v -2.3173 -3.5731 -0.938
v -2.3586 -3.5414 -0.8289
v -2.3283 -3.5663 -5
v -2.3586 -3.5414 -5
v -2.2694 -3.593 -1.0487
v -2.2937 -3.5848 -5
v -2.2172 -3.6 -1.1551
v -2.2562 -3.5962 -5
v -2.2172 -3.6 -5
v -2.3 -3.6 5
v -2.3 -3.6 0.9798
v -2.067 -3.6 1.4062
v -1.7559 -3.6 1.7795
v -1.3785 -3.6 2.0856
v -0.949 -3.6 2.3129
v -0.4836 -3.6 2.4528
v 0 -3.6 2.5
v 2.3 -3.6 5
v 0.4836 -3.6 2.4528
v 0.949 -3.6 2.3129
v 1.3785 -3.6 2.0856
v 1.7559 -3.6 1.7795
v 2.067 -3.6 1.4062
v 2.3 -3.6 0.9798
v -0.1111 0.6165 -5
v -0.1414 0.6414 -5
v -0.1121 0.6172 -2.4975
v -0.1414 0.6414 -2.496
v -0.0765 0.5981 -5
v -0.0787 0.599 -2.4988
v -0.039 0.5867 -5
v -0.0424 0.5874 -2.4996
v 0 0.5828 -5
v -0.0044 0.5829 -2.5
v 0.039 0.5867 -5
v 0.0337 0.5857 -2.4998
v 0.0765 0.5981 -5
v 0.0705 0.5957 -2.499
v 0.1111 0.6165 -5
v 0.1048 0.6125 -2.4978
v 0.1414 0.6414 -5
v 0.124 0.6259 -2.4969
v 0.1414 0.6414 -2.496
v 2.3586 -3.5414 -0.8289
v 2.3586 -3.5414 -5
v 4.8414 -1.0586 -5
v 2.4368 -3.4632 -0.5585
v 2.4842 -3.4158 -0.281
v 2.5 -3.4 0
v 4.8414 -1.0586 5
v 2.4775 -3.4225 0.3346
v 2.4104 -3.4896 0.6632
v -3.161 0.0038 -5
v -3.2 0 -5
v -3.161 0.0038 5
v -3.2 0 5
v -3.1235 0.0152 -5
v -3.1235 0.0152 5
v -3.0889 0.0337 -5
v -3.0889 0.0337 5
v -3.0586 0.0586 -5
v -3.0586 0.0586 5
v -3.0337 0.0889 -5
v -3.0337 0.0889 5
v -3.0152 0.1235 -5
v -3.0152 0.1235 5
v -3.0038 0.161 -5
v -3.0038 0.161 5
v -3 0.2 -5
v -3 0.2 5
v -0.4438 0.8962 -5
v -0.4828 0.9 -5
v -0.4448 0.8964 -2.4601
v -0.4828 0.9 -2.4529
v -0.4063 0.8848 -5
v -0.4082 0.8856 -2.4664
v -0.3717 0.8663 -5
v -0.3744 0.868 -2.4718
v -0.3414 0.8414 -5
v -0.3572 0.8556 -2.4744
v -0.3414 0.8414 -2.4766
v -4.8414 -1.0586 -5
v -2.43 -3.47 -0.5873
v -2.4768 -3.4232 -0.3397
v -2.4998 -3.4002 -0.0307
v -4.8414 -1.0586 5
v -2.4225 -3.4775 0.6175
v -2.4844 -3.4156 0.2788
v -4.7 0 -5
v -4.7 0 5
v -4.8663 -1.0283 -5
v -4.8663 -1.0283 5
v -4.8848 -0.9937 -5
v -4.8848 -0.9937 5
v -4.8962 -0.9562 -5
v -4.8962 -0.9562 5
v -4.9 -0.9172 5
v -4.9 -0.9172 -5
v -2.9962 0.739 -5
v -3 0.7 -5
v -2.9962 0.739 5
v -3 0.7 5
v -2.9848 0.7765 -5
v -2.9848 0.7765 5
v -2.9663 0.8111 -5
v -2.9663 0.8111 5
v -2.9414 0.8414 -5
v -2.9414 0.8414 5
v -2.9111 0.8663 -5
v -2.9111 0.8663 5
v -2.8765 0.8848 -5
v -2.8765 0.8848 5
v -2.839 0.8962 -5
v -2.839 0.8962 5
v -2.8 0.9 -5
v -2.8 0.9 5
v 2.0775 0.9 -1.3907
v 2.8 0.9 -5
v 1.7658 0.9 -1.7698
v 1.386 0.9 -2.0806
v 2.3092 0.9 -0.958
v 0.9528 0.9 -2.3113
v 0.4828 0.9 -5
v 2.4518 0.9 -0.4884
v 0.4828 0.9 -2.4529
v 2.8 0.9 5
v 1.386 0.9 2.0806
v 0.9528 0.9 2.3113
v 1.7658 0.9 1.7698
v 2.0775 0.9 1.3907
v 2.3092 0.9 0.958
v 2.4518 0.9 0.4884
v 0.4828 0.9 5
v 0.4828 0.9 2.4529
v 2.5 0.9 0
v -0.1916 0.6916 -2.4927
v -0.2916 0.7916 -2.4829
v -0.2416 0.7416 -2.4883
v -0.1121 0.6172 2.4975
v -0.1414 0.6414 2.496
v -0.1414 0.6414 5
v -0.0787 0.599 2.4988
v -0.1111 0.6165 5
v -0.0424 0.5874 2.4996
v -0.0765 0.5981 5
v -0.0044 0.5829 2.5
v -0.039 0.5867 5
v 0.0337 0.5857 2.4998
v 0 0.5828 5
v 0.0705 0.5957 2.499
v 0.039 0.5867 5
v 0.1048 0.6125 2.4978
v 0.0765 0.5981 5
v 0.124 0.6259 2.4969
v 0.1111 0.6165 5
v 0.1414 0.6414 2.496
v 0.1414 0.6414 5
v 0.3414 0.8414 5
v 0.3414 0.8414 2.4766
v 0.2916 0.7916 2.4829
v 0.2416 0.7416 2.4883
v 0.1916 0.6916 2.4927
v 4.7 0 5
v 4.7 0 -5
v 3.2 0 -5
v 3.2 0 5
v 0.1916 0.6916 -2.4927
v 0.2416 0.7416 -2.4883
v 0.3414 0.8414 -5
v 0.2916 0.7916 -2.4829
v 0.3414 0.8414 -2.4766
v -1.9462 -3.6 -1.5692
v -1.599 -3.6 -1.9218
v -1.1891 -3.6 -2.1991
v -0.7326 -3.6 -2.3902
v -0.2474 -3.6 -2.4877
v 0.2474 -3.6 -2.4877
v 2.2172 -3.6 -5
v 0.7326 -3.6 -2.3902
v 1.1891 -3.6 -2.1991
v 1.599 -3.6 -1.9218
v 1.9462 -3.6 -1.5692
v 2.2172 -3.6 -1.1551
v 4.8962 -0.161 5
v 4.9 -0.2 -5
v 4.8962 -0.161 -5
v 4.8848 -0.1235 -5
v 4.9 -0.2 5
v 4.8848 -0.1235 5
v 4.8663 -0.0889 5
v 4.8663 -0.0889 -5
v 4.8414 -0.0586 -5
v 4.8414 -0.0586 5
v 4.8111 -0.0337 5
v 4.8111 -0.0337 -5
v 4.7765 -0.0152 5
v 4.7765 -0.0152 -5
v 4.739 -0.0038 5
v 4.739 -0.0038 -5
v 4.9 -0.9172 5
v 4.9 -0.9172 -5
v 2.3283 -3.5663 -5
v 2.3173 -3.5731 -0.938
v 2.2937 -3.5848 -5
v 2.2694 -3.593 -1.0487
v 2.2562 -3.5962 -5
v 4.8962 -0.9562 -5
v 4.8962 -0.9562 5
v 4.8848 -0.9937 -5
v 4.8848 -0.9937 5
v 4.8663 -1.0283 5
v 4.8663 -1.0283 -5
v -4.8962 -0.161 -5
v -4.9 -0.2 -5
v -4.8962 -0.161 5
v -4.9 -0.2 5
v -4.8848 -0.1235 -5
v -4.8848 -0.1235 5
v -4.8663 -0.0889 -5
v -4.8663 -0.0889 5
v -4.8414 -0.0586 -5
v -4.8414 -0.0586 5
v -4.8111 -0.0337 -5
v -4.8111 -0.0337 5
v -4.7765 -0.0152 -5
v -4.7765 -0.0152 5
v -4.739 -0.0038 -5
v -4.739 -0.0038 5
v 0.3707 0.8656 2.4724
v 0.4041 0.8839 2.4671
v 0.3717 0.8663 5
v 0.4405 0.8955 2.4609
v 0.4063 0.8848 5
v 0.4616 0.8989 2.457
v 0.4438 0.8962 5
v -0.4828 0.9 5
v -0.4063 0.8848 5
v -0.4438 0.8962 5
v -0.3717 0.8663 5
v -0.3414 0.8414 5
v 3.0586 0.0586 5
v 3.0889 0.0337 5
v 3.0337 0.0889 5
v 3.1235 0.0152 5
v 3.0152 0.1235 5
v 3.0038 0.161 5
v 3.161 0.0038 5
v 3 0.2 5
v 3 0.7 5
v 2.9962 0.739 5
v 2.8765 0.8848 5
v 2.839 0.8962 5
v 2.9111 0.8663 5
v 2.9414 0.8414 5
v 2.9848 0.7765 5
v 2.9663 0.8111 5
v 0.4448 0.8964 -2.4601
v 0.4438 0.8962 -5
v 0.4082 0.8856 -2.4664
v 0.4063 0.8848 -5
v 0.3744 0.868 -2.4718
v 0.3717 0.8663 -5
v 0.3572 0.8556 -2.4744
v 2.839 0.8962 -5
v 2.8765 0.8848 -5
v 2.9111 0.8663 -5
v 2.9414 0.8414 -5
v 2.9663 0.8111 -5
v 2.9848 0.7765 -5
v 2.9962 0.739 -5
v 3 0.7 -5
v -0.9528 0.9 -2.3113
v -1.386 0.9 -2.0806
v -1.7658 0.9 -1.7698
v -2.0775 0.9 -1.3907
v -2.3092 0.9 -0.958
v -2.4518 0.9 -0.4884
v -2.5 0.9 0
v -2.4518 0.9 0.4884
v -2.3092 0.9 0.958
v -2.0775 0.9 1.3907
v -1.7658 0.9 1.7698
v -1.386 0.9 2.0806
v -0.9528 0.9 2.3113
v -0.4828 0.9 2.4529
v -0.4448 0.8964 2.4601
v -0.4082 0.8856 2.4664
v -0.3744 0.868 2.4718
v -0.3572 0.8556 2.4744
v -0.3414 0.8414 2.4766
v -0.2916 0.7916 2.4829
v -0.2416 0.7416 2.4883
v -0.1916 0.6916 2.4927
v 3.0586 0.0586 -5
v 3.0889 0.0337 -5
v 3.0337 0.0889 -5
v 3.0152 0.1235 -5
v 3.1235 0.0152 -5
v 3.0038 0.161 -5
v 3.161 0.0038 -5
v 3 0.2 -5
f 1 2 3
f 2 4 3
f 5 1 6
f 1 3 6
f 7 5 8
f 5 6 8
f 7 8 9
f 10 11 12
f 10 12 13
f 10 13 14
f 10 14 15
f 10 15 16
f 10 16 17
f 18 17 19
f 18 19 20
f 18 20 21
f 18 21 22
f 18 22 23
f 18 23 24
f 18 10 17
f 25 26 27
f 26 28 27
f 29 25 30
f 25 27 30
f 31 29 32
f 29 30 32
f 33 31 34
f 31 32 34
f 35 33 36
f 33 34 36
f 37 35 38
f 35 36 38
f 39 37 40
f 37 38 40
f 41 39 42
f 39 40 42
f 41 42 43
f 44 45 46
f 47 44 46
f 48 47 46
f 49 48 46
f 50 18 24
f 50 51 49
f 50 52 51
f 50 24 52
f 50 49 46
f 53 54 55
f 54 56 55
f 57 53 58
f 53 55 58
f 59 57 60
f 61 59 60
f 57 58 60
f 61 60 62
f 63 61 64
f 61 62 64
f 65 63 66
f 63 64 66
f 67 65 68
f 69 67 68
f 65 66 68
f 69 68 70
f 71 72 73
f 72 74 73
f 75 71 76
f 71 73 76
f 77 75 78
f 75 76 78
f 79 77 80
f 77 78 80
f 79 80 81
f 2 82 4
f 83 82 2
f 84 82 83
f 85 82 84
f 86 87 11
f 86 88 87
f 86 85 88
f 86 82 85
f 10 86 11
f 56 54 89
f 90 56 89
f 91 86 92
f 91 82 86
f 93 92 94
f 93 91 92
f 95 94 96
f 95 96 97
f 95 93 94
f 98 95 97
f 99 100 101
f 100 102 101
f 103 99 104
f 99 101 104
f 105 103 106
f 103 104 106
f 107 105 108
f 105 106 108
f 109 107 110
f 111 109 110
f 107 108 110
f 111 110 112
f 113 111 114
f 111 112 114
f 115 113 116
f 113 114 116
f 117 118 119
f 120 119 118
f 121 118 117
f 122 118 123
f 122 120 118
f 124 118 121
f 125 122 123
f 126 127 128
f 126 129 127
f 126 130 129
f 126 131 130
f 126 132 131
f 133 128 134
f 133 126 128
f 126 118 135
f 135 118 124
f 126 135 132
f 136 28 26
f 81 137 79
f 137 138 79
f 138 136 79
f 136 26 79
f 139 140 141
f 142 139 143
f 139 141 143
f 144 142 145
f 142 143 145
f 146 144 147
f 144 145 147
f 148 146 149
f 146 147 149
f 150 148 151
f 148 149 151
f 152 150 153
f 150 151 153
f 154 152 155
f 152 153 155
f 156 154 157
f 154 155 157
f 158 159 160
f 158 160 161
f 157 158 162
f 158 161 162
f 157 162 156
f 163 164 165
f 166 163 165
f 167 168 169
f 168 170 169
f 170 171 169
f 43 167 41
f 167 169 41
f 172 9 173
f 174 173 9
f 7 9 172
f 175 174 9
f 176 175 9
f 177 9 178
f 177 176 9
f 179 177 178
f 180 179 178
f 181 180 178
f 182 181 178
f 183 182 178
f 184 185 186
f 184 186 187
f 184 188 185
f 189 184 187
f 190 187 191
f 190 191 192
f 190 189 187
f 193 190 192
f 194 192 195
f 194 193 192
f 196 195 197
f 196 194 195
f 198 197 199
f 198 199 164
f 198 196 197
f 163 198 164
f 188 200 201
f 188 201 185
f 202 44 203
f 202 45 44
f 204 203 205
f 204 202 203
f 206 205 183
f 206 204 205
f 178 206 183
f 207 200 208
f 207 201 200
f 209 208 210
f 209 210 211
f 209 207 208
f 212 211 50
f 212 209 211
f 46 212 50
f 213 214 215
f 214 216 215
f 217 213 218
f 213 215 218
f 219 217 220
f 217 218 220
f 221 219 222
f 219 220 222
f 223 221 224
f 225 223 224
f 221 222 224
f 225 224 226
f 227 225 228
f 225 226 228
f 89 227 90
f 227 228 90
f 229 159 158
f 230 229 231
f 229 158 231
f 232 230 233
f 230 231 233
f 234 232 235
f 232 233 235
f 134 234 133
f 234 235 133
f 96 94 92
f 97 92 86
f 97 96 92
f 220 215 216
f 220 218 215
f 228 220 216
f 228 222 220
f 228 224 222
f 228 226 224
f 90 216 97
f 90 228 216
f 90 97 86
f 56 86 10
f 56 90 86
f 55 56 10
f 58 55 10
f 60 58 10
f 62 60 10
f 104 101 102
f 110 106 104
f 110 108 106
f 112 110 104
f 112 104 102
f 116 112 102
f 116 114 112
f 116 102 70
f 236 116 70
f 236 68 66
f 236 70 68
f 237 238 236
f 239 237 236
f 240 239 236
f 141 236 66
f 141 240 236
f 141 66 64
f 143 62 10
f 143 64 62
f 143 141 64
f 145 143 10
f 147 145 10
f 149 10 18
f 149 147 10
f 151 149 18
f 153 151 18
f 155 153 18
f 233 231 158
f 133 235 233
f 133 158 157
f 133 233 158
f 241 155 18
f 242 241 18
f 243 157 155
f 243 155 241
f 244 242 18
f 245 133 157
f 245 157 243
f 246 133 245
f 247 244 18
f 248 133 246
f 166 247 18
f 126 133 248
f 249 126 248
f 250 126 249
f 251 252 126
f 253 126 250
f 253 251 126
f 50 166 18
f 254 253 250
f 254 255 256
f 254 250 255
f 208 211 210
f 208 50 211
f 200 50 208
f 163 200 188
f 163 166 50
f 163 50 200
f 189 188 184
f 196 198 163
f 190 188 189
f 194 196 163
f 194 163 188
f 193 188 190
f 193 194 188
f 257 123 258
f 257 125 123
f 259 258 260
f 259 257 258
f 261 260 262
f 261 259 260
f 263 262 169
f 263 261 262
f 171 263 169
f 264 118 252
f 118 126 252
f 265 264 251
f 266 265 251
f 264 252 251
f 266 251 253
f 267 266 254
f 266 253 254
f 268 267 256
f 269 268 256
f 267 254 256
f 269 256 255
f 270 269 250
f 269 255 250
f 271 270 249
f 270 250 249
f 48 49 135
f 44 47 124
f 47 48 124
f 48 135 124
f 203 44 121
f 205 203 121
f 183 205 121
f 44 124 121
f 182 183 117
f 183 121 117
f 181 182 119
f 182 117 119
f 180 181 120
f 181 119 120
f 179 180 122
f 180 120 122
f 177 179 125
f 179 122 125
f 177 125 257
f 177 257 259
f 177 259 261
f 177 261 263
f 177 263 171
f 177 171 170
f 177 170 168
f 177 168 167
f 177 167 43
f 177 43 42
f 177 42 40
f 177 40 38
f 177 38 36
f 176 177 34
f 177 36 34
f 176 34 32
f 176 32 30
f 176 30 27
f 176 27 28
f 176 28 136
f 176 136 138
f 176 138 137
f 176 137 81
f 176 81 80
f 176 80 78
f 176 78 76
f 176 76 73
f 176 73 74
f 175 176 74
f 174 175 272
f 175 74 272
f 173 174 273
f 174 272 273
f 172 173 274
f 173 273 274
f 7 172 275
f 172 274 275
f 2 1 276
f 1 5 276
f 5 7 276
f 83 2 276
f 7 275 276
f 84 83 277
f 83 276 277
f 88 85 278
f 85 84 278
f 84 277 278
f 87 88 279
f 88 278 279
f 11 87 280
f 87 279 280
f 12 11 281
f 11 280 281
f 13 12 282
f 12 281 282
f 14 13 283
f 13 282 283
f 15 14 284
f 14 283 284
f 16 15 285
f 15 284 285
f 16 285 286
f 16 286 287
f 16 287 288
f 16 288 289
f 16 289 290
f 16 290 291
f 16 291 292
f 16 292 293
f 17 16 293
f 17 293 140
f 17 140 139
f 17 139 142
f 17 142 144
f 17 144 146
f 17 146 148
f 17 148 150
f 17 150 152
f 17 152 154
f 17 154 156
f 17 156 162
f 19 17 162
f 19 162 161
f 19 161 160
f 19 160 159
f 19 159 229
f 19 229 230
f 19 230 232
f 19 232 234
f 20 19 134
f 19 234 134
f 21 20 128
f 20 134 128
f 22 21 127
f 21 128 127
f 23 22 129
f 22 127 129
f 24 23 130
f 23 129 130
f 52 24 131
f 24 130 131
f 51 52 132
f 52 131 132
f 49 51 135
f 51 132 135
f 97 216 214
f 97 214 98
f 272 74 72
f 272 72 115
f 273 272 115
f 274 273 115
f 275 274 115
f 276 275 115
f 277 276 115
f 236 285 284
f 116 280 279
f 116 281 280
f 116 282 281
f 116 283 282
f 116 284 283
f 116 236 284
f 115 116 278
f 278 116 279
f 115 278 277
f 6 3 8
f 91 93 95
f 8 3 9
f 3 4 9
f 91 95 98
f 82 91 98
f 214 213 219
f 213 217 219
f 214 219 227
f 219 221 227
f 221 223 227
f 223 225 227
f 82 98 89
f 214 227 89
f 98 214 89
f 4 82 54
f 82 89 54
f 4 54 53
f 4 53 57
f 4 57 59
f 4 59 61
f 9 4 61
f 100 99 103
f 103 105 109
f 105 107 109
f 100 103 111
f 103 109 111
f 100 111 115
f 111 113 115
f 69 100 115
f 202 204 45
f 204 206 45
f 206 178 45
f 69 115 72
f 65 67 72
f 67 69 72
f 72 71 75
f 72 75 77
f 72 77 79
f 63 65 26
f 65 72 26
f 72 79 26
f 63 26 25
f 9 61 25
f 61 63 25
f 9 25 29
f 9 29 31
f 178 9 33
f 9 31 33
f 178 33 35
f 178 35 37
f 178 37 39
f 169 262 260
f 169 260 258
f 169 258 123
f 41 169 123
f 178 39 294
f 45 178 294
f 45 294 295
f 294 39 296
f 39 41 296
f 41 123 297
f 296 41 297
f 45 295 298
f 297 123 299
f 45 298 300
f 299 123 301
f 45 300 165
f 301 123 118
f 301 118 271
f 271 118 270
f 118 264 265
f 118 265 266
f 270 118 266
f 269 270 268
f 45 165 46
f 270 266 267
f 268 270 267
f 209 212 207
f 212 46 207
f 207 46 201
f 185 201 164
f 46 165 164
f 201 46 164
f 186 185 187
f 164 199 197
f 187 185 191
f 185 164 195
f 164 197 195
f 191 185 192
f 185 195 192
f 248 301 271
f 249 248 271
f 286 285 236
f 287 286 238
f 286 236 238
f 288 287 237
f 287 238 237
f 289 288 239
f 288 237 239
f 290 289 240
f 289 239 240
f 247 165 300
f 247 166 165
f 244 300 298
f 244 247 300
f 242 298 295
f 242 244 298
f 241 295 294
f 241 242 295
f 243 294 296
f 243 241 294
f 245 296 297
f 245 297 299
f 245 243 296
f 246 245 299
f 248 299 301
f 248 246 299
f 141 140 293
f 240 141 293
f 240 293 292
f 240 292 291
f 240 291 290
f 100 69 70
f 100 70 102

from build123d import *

# Parameters (mm, degrees)
EXTRUDE_BODY_DEPTH = 10
SKETCH2_W          = 1.9
SKETCH2_H          = 0.9
CUT_EXTRUDE1_DEPTH = 12.703418304
SKETCH3_W          = 1.9
SKETCH3_H          = 0.9
CUT_EXTRUDE2_DEPTH = 12.703418304
CUT_EXTRUDE3_DEPTH = 12.703418304
HOLE_REVOLVE_D     = 5
EDGE_FILLETS_R     = 0.2


with BuildPart() as part:
    # Sketch1 → Extrude Body (new body)
    with BuildSketch(Plane.XY.offset(5)):
        Polygon((4.9, -1), (4.9, 0.9), (-4.9, 0.9), (-4.9, -1), (-2.3, -3.6), (2.3, -3.6), align=None)
    extrude(amount=-EXTRUDE_BODY_DEPTH)

    # Sketch2 → Cut-Extrude1 (cut, through all)
    with BuildSketch(Plane(origin=(0, 0, -5), x_dir=(-1, 0, 0), z_dir=(0, 0, -1))):
        with Locations((3.95, 0.45)):
            Rectangle(SKETCH2_W, SKETCH2_H)
    extrude(amount=-CUT_EXTRUDE1_DEPTH, mode=Mode.SUBTRACT)

    # Sketch3 → Cut-Extrude2 (cut, through all)
    with BuildSketch(Plane(origin=(0, 0, -5), x_dir=(-1, 0, 0), z_dir=(0, 0, -1))):
        with Locations((-3.95, 0.45)):
            Rectangle(SKETCH3_W, SKETCH3_H)
    extrude(amount=-CUT_EXTRUDE2_DEPTH, mode=Mode.SUBTRACT)

    # Sketch4 → Cut-Extrude3 (cut, through all)
    with BuildSketch(Plane(origin=(0, 0, -5), x_dir=(-1, 0, 0), z_dir=(0, 0, -1))):
        Polygon((0.4, 0.9), (-0.4, 0.9), (0, 0.5), align=None)
    extrude(amount=-CUT_EXTRUDE3_DEPTH, mode=Mode.SUBTRACT)

    # Hole Revolve (through all)
    with Locations(Plane(origin=(0, -3.6, 0), x_dir=(-1, 0, 0), z_dir=(0, -1, 0))):
        with Locations((0, 0)):
            Hole(HOLE_REVOLVE_D / 2)

    # Edge Fillets
    edge_fillets_edges = [part.edges().sort_by_distance(p)[0] for p in [
        (4.9, 0, 0),
        (3, 0, 0),
        (-4.9, -1, 0),
        (3, 0.9, 0),
        (-3, 0, 0),
        (0.4, 0.9, -3.733896268),
        (0, 0.5, 3.75),
        (-0.4, 0.9, -3.733896268),
        (4.9, -1, 0),
        (-3, 0.9, 0),
        (0, 0.5, -3.75),
        (-0.4, 0.9, 3.733896268),
        (-4.9, 0, 0),
        (-2.3, -3.6, -2.989897949),
        (0.4, 0.9, 3.733896268),
        (2.3, -3.6, -2.989897949),
    ]]
    fillet(edge_fillets_edges, radius=EDGE_FILLETS_R)


solid = part.part
